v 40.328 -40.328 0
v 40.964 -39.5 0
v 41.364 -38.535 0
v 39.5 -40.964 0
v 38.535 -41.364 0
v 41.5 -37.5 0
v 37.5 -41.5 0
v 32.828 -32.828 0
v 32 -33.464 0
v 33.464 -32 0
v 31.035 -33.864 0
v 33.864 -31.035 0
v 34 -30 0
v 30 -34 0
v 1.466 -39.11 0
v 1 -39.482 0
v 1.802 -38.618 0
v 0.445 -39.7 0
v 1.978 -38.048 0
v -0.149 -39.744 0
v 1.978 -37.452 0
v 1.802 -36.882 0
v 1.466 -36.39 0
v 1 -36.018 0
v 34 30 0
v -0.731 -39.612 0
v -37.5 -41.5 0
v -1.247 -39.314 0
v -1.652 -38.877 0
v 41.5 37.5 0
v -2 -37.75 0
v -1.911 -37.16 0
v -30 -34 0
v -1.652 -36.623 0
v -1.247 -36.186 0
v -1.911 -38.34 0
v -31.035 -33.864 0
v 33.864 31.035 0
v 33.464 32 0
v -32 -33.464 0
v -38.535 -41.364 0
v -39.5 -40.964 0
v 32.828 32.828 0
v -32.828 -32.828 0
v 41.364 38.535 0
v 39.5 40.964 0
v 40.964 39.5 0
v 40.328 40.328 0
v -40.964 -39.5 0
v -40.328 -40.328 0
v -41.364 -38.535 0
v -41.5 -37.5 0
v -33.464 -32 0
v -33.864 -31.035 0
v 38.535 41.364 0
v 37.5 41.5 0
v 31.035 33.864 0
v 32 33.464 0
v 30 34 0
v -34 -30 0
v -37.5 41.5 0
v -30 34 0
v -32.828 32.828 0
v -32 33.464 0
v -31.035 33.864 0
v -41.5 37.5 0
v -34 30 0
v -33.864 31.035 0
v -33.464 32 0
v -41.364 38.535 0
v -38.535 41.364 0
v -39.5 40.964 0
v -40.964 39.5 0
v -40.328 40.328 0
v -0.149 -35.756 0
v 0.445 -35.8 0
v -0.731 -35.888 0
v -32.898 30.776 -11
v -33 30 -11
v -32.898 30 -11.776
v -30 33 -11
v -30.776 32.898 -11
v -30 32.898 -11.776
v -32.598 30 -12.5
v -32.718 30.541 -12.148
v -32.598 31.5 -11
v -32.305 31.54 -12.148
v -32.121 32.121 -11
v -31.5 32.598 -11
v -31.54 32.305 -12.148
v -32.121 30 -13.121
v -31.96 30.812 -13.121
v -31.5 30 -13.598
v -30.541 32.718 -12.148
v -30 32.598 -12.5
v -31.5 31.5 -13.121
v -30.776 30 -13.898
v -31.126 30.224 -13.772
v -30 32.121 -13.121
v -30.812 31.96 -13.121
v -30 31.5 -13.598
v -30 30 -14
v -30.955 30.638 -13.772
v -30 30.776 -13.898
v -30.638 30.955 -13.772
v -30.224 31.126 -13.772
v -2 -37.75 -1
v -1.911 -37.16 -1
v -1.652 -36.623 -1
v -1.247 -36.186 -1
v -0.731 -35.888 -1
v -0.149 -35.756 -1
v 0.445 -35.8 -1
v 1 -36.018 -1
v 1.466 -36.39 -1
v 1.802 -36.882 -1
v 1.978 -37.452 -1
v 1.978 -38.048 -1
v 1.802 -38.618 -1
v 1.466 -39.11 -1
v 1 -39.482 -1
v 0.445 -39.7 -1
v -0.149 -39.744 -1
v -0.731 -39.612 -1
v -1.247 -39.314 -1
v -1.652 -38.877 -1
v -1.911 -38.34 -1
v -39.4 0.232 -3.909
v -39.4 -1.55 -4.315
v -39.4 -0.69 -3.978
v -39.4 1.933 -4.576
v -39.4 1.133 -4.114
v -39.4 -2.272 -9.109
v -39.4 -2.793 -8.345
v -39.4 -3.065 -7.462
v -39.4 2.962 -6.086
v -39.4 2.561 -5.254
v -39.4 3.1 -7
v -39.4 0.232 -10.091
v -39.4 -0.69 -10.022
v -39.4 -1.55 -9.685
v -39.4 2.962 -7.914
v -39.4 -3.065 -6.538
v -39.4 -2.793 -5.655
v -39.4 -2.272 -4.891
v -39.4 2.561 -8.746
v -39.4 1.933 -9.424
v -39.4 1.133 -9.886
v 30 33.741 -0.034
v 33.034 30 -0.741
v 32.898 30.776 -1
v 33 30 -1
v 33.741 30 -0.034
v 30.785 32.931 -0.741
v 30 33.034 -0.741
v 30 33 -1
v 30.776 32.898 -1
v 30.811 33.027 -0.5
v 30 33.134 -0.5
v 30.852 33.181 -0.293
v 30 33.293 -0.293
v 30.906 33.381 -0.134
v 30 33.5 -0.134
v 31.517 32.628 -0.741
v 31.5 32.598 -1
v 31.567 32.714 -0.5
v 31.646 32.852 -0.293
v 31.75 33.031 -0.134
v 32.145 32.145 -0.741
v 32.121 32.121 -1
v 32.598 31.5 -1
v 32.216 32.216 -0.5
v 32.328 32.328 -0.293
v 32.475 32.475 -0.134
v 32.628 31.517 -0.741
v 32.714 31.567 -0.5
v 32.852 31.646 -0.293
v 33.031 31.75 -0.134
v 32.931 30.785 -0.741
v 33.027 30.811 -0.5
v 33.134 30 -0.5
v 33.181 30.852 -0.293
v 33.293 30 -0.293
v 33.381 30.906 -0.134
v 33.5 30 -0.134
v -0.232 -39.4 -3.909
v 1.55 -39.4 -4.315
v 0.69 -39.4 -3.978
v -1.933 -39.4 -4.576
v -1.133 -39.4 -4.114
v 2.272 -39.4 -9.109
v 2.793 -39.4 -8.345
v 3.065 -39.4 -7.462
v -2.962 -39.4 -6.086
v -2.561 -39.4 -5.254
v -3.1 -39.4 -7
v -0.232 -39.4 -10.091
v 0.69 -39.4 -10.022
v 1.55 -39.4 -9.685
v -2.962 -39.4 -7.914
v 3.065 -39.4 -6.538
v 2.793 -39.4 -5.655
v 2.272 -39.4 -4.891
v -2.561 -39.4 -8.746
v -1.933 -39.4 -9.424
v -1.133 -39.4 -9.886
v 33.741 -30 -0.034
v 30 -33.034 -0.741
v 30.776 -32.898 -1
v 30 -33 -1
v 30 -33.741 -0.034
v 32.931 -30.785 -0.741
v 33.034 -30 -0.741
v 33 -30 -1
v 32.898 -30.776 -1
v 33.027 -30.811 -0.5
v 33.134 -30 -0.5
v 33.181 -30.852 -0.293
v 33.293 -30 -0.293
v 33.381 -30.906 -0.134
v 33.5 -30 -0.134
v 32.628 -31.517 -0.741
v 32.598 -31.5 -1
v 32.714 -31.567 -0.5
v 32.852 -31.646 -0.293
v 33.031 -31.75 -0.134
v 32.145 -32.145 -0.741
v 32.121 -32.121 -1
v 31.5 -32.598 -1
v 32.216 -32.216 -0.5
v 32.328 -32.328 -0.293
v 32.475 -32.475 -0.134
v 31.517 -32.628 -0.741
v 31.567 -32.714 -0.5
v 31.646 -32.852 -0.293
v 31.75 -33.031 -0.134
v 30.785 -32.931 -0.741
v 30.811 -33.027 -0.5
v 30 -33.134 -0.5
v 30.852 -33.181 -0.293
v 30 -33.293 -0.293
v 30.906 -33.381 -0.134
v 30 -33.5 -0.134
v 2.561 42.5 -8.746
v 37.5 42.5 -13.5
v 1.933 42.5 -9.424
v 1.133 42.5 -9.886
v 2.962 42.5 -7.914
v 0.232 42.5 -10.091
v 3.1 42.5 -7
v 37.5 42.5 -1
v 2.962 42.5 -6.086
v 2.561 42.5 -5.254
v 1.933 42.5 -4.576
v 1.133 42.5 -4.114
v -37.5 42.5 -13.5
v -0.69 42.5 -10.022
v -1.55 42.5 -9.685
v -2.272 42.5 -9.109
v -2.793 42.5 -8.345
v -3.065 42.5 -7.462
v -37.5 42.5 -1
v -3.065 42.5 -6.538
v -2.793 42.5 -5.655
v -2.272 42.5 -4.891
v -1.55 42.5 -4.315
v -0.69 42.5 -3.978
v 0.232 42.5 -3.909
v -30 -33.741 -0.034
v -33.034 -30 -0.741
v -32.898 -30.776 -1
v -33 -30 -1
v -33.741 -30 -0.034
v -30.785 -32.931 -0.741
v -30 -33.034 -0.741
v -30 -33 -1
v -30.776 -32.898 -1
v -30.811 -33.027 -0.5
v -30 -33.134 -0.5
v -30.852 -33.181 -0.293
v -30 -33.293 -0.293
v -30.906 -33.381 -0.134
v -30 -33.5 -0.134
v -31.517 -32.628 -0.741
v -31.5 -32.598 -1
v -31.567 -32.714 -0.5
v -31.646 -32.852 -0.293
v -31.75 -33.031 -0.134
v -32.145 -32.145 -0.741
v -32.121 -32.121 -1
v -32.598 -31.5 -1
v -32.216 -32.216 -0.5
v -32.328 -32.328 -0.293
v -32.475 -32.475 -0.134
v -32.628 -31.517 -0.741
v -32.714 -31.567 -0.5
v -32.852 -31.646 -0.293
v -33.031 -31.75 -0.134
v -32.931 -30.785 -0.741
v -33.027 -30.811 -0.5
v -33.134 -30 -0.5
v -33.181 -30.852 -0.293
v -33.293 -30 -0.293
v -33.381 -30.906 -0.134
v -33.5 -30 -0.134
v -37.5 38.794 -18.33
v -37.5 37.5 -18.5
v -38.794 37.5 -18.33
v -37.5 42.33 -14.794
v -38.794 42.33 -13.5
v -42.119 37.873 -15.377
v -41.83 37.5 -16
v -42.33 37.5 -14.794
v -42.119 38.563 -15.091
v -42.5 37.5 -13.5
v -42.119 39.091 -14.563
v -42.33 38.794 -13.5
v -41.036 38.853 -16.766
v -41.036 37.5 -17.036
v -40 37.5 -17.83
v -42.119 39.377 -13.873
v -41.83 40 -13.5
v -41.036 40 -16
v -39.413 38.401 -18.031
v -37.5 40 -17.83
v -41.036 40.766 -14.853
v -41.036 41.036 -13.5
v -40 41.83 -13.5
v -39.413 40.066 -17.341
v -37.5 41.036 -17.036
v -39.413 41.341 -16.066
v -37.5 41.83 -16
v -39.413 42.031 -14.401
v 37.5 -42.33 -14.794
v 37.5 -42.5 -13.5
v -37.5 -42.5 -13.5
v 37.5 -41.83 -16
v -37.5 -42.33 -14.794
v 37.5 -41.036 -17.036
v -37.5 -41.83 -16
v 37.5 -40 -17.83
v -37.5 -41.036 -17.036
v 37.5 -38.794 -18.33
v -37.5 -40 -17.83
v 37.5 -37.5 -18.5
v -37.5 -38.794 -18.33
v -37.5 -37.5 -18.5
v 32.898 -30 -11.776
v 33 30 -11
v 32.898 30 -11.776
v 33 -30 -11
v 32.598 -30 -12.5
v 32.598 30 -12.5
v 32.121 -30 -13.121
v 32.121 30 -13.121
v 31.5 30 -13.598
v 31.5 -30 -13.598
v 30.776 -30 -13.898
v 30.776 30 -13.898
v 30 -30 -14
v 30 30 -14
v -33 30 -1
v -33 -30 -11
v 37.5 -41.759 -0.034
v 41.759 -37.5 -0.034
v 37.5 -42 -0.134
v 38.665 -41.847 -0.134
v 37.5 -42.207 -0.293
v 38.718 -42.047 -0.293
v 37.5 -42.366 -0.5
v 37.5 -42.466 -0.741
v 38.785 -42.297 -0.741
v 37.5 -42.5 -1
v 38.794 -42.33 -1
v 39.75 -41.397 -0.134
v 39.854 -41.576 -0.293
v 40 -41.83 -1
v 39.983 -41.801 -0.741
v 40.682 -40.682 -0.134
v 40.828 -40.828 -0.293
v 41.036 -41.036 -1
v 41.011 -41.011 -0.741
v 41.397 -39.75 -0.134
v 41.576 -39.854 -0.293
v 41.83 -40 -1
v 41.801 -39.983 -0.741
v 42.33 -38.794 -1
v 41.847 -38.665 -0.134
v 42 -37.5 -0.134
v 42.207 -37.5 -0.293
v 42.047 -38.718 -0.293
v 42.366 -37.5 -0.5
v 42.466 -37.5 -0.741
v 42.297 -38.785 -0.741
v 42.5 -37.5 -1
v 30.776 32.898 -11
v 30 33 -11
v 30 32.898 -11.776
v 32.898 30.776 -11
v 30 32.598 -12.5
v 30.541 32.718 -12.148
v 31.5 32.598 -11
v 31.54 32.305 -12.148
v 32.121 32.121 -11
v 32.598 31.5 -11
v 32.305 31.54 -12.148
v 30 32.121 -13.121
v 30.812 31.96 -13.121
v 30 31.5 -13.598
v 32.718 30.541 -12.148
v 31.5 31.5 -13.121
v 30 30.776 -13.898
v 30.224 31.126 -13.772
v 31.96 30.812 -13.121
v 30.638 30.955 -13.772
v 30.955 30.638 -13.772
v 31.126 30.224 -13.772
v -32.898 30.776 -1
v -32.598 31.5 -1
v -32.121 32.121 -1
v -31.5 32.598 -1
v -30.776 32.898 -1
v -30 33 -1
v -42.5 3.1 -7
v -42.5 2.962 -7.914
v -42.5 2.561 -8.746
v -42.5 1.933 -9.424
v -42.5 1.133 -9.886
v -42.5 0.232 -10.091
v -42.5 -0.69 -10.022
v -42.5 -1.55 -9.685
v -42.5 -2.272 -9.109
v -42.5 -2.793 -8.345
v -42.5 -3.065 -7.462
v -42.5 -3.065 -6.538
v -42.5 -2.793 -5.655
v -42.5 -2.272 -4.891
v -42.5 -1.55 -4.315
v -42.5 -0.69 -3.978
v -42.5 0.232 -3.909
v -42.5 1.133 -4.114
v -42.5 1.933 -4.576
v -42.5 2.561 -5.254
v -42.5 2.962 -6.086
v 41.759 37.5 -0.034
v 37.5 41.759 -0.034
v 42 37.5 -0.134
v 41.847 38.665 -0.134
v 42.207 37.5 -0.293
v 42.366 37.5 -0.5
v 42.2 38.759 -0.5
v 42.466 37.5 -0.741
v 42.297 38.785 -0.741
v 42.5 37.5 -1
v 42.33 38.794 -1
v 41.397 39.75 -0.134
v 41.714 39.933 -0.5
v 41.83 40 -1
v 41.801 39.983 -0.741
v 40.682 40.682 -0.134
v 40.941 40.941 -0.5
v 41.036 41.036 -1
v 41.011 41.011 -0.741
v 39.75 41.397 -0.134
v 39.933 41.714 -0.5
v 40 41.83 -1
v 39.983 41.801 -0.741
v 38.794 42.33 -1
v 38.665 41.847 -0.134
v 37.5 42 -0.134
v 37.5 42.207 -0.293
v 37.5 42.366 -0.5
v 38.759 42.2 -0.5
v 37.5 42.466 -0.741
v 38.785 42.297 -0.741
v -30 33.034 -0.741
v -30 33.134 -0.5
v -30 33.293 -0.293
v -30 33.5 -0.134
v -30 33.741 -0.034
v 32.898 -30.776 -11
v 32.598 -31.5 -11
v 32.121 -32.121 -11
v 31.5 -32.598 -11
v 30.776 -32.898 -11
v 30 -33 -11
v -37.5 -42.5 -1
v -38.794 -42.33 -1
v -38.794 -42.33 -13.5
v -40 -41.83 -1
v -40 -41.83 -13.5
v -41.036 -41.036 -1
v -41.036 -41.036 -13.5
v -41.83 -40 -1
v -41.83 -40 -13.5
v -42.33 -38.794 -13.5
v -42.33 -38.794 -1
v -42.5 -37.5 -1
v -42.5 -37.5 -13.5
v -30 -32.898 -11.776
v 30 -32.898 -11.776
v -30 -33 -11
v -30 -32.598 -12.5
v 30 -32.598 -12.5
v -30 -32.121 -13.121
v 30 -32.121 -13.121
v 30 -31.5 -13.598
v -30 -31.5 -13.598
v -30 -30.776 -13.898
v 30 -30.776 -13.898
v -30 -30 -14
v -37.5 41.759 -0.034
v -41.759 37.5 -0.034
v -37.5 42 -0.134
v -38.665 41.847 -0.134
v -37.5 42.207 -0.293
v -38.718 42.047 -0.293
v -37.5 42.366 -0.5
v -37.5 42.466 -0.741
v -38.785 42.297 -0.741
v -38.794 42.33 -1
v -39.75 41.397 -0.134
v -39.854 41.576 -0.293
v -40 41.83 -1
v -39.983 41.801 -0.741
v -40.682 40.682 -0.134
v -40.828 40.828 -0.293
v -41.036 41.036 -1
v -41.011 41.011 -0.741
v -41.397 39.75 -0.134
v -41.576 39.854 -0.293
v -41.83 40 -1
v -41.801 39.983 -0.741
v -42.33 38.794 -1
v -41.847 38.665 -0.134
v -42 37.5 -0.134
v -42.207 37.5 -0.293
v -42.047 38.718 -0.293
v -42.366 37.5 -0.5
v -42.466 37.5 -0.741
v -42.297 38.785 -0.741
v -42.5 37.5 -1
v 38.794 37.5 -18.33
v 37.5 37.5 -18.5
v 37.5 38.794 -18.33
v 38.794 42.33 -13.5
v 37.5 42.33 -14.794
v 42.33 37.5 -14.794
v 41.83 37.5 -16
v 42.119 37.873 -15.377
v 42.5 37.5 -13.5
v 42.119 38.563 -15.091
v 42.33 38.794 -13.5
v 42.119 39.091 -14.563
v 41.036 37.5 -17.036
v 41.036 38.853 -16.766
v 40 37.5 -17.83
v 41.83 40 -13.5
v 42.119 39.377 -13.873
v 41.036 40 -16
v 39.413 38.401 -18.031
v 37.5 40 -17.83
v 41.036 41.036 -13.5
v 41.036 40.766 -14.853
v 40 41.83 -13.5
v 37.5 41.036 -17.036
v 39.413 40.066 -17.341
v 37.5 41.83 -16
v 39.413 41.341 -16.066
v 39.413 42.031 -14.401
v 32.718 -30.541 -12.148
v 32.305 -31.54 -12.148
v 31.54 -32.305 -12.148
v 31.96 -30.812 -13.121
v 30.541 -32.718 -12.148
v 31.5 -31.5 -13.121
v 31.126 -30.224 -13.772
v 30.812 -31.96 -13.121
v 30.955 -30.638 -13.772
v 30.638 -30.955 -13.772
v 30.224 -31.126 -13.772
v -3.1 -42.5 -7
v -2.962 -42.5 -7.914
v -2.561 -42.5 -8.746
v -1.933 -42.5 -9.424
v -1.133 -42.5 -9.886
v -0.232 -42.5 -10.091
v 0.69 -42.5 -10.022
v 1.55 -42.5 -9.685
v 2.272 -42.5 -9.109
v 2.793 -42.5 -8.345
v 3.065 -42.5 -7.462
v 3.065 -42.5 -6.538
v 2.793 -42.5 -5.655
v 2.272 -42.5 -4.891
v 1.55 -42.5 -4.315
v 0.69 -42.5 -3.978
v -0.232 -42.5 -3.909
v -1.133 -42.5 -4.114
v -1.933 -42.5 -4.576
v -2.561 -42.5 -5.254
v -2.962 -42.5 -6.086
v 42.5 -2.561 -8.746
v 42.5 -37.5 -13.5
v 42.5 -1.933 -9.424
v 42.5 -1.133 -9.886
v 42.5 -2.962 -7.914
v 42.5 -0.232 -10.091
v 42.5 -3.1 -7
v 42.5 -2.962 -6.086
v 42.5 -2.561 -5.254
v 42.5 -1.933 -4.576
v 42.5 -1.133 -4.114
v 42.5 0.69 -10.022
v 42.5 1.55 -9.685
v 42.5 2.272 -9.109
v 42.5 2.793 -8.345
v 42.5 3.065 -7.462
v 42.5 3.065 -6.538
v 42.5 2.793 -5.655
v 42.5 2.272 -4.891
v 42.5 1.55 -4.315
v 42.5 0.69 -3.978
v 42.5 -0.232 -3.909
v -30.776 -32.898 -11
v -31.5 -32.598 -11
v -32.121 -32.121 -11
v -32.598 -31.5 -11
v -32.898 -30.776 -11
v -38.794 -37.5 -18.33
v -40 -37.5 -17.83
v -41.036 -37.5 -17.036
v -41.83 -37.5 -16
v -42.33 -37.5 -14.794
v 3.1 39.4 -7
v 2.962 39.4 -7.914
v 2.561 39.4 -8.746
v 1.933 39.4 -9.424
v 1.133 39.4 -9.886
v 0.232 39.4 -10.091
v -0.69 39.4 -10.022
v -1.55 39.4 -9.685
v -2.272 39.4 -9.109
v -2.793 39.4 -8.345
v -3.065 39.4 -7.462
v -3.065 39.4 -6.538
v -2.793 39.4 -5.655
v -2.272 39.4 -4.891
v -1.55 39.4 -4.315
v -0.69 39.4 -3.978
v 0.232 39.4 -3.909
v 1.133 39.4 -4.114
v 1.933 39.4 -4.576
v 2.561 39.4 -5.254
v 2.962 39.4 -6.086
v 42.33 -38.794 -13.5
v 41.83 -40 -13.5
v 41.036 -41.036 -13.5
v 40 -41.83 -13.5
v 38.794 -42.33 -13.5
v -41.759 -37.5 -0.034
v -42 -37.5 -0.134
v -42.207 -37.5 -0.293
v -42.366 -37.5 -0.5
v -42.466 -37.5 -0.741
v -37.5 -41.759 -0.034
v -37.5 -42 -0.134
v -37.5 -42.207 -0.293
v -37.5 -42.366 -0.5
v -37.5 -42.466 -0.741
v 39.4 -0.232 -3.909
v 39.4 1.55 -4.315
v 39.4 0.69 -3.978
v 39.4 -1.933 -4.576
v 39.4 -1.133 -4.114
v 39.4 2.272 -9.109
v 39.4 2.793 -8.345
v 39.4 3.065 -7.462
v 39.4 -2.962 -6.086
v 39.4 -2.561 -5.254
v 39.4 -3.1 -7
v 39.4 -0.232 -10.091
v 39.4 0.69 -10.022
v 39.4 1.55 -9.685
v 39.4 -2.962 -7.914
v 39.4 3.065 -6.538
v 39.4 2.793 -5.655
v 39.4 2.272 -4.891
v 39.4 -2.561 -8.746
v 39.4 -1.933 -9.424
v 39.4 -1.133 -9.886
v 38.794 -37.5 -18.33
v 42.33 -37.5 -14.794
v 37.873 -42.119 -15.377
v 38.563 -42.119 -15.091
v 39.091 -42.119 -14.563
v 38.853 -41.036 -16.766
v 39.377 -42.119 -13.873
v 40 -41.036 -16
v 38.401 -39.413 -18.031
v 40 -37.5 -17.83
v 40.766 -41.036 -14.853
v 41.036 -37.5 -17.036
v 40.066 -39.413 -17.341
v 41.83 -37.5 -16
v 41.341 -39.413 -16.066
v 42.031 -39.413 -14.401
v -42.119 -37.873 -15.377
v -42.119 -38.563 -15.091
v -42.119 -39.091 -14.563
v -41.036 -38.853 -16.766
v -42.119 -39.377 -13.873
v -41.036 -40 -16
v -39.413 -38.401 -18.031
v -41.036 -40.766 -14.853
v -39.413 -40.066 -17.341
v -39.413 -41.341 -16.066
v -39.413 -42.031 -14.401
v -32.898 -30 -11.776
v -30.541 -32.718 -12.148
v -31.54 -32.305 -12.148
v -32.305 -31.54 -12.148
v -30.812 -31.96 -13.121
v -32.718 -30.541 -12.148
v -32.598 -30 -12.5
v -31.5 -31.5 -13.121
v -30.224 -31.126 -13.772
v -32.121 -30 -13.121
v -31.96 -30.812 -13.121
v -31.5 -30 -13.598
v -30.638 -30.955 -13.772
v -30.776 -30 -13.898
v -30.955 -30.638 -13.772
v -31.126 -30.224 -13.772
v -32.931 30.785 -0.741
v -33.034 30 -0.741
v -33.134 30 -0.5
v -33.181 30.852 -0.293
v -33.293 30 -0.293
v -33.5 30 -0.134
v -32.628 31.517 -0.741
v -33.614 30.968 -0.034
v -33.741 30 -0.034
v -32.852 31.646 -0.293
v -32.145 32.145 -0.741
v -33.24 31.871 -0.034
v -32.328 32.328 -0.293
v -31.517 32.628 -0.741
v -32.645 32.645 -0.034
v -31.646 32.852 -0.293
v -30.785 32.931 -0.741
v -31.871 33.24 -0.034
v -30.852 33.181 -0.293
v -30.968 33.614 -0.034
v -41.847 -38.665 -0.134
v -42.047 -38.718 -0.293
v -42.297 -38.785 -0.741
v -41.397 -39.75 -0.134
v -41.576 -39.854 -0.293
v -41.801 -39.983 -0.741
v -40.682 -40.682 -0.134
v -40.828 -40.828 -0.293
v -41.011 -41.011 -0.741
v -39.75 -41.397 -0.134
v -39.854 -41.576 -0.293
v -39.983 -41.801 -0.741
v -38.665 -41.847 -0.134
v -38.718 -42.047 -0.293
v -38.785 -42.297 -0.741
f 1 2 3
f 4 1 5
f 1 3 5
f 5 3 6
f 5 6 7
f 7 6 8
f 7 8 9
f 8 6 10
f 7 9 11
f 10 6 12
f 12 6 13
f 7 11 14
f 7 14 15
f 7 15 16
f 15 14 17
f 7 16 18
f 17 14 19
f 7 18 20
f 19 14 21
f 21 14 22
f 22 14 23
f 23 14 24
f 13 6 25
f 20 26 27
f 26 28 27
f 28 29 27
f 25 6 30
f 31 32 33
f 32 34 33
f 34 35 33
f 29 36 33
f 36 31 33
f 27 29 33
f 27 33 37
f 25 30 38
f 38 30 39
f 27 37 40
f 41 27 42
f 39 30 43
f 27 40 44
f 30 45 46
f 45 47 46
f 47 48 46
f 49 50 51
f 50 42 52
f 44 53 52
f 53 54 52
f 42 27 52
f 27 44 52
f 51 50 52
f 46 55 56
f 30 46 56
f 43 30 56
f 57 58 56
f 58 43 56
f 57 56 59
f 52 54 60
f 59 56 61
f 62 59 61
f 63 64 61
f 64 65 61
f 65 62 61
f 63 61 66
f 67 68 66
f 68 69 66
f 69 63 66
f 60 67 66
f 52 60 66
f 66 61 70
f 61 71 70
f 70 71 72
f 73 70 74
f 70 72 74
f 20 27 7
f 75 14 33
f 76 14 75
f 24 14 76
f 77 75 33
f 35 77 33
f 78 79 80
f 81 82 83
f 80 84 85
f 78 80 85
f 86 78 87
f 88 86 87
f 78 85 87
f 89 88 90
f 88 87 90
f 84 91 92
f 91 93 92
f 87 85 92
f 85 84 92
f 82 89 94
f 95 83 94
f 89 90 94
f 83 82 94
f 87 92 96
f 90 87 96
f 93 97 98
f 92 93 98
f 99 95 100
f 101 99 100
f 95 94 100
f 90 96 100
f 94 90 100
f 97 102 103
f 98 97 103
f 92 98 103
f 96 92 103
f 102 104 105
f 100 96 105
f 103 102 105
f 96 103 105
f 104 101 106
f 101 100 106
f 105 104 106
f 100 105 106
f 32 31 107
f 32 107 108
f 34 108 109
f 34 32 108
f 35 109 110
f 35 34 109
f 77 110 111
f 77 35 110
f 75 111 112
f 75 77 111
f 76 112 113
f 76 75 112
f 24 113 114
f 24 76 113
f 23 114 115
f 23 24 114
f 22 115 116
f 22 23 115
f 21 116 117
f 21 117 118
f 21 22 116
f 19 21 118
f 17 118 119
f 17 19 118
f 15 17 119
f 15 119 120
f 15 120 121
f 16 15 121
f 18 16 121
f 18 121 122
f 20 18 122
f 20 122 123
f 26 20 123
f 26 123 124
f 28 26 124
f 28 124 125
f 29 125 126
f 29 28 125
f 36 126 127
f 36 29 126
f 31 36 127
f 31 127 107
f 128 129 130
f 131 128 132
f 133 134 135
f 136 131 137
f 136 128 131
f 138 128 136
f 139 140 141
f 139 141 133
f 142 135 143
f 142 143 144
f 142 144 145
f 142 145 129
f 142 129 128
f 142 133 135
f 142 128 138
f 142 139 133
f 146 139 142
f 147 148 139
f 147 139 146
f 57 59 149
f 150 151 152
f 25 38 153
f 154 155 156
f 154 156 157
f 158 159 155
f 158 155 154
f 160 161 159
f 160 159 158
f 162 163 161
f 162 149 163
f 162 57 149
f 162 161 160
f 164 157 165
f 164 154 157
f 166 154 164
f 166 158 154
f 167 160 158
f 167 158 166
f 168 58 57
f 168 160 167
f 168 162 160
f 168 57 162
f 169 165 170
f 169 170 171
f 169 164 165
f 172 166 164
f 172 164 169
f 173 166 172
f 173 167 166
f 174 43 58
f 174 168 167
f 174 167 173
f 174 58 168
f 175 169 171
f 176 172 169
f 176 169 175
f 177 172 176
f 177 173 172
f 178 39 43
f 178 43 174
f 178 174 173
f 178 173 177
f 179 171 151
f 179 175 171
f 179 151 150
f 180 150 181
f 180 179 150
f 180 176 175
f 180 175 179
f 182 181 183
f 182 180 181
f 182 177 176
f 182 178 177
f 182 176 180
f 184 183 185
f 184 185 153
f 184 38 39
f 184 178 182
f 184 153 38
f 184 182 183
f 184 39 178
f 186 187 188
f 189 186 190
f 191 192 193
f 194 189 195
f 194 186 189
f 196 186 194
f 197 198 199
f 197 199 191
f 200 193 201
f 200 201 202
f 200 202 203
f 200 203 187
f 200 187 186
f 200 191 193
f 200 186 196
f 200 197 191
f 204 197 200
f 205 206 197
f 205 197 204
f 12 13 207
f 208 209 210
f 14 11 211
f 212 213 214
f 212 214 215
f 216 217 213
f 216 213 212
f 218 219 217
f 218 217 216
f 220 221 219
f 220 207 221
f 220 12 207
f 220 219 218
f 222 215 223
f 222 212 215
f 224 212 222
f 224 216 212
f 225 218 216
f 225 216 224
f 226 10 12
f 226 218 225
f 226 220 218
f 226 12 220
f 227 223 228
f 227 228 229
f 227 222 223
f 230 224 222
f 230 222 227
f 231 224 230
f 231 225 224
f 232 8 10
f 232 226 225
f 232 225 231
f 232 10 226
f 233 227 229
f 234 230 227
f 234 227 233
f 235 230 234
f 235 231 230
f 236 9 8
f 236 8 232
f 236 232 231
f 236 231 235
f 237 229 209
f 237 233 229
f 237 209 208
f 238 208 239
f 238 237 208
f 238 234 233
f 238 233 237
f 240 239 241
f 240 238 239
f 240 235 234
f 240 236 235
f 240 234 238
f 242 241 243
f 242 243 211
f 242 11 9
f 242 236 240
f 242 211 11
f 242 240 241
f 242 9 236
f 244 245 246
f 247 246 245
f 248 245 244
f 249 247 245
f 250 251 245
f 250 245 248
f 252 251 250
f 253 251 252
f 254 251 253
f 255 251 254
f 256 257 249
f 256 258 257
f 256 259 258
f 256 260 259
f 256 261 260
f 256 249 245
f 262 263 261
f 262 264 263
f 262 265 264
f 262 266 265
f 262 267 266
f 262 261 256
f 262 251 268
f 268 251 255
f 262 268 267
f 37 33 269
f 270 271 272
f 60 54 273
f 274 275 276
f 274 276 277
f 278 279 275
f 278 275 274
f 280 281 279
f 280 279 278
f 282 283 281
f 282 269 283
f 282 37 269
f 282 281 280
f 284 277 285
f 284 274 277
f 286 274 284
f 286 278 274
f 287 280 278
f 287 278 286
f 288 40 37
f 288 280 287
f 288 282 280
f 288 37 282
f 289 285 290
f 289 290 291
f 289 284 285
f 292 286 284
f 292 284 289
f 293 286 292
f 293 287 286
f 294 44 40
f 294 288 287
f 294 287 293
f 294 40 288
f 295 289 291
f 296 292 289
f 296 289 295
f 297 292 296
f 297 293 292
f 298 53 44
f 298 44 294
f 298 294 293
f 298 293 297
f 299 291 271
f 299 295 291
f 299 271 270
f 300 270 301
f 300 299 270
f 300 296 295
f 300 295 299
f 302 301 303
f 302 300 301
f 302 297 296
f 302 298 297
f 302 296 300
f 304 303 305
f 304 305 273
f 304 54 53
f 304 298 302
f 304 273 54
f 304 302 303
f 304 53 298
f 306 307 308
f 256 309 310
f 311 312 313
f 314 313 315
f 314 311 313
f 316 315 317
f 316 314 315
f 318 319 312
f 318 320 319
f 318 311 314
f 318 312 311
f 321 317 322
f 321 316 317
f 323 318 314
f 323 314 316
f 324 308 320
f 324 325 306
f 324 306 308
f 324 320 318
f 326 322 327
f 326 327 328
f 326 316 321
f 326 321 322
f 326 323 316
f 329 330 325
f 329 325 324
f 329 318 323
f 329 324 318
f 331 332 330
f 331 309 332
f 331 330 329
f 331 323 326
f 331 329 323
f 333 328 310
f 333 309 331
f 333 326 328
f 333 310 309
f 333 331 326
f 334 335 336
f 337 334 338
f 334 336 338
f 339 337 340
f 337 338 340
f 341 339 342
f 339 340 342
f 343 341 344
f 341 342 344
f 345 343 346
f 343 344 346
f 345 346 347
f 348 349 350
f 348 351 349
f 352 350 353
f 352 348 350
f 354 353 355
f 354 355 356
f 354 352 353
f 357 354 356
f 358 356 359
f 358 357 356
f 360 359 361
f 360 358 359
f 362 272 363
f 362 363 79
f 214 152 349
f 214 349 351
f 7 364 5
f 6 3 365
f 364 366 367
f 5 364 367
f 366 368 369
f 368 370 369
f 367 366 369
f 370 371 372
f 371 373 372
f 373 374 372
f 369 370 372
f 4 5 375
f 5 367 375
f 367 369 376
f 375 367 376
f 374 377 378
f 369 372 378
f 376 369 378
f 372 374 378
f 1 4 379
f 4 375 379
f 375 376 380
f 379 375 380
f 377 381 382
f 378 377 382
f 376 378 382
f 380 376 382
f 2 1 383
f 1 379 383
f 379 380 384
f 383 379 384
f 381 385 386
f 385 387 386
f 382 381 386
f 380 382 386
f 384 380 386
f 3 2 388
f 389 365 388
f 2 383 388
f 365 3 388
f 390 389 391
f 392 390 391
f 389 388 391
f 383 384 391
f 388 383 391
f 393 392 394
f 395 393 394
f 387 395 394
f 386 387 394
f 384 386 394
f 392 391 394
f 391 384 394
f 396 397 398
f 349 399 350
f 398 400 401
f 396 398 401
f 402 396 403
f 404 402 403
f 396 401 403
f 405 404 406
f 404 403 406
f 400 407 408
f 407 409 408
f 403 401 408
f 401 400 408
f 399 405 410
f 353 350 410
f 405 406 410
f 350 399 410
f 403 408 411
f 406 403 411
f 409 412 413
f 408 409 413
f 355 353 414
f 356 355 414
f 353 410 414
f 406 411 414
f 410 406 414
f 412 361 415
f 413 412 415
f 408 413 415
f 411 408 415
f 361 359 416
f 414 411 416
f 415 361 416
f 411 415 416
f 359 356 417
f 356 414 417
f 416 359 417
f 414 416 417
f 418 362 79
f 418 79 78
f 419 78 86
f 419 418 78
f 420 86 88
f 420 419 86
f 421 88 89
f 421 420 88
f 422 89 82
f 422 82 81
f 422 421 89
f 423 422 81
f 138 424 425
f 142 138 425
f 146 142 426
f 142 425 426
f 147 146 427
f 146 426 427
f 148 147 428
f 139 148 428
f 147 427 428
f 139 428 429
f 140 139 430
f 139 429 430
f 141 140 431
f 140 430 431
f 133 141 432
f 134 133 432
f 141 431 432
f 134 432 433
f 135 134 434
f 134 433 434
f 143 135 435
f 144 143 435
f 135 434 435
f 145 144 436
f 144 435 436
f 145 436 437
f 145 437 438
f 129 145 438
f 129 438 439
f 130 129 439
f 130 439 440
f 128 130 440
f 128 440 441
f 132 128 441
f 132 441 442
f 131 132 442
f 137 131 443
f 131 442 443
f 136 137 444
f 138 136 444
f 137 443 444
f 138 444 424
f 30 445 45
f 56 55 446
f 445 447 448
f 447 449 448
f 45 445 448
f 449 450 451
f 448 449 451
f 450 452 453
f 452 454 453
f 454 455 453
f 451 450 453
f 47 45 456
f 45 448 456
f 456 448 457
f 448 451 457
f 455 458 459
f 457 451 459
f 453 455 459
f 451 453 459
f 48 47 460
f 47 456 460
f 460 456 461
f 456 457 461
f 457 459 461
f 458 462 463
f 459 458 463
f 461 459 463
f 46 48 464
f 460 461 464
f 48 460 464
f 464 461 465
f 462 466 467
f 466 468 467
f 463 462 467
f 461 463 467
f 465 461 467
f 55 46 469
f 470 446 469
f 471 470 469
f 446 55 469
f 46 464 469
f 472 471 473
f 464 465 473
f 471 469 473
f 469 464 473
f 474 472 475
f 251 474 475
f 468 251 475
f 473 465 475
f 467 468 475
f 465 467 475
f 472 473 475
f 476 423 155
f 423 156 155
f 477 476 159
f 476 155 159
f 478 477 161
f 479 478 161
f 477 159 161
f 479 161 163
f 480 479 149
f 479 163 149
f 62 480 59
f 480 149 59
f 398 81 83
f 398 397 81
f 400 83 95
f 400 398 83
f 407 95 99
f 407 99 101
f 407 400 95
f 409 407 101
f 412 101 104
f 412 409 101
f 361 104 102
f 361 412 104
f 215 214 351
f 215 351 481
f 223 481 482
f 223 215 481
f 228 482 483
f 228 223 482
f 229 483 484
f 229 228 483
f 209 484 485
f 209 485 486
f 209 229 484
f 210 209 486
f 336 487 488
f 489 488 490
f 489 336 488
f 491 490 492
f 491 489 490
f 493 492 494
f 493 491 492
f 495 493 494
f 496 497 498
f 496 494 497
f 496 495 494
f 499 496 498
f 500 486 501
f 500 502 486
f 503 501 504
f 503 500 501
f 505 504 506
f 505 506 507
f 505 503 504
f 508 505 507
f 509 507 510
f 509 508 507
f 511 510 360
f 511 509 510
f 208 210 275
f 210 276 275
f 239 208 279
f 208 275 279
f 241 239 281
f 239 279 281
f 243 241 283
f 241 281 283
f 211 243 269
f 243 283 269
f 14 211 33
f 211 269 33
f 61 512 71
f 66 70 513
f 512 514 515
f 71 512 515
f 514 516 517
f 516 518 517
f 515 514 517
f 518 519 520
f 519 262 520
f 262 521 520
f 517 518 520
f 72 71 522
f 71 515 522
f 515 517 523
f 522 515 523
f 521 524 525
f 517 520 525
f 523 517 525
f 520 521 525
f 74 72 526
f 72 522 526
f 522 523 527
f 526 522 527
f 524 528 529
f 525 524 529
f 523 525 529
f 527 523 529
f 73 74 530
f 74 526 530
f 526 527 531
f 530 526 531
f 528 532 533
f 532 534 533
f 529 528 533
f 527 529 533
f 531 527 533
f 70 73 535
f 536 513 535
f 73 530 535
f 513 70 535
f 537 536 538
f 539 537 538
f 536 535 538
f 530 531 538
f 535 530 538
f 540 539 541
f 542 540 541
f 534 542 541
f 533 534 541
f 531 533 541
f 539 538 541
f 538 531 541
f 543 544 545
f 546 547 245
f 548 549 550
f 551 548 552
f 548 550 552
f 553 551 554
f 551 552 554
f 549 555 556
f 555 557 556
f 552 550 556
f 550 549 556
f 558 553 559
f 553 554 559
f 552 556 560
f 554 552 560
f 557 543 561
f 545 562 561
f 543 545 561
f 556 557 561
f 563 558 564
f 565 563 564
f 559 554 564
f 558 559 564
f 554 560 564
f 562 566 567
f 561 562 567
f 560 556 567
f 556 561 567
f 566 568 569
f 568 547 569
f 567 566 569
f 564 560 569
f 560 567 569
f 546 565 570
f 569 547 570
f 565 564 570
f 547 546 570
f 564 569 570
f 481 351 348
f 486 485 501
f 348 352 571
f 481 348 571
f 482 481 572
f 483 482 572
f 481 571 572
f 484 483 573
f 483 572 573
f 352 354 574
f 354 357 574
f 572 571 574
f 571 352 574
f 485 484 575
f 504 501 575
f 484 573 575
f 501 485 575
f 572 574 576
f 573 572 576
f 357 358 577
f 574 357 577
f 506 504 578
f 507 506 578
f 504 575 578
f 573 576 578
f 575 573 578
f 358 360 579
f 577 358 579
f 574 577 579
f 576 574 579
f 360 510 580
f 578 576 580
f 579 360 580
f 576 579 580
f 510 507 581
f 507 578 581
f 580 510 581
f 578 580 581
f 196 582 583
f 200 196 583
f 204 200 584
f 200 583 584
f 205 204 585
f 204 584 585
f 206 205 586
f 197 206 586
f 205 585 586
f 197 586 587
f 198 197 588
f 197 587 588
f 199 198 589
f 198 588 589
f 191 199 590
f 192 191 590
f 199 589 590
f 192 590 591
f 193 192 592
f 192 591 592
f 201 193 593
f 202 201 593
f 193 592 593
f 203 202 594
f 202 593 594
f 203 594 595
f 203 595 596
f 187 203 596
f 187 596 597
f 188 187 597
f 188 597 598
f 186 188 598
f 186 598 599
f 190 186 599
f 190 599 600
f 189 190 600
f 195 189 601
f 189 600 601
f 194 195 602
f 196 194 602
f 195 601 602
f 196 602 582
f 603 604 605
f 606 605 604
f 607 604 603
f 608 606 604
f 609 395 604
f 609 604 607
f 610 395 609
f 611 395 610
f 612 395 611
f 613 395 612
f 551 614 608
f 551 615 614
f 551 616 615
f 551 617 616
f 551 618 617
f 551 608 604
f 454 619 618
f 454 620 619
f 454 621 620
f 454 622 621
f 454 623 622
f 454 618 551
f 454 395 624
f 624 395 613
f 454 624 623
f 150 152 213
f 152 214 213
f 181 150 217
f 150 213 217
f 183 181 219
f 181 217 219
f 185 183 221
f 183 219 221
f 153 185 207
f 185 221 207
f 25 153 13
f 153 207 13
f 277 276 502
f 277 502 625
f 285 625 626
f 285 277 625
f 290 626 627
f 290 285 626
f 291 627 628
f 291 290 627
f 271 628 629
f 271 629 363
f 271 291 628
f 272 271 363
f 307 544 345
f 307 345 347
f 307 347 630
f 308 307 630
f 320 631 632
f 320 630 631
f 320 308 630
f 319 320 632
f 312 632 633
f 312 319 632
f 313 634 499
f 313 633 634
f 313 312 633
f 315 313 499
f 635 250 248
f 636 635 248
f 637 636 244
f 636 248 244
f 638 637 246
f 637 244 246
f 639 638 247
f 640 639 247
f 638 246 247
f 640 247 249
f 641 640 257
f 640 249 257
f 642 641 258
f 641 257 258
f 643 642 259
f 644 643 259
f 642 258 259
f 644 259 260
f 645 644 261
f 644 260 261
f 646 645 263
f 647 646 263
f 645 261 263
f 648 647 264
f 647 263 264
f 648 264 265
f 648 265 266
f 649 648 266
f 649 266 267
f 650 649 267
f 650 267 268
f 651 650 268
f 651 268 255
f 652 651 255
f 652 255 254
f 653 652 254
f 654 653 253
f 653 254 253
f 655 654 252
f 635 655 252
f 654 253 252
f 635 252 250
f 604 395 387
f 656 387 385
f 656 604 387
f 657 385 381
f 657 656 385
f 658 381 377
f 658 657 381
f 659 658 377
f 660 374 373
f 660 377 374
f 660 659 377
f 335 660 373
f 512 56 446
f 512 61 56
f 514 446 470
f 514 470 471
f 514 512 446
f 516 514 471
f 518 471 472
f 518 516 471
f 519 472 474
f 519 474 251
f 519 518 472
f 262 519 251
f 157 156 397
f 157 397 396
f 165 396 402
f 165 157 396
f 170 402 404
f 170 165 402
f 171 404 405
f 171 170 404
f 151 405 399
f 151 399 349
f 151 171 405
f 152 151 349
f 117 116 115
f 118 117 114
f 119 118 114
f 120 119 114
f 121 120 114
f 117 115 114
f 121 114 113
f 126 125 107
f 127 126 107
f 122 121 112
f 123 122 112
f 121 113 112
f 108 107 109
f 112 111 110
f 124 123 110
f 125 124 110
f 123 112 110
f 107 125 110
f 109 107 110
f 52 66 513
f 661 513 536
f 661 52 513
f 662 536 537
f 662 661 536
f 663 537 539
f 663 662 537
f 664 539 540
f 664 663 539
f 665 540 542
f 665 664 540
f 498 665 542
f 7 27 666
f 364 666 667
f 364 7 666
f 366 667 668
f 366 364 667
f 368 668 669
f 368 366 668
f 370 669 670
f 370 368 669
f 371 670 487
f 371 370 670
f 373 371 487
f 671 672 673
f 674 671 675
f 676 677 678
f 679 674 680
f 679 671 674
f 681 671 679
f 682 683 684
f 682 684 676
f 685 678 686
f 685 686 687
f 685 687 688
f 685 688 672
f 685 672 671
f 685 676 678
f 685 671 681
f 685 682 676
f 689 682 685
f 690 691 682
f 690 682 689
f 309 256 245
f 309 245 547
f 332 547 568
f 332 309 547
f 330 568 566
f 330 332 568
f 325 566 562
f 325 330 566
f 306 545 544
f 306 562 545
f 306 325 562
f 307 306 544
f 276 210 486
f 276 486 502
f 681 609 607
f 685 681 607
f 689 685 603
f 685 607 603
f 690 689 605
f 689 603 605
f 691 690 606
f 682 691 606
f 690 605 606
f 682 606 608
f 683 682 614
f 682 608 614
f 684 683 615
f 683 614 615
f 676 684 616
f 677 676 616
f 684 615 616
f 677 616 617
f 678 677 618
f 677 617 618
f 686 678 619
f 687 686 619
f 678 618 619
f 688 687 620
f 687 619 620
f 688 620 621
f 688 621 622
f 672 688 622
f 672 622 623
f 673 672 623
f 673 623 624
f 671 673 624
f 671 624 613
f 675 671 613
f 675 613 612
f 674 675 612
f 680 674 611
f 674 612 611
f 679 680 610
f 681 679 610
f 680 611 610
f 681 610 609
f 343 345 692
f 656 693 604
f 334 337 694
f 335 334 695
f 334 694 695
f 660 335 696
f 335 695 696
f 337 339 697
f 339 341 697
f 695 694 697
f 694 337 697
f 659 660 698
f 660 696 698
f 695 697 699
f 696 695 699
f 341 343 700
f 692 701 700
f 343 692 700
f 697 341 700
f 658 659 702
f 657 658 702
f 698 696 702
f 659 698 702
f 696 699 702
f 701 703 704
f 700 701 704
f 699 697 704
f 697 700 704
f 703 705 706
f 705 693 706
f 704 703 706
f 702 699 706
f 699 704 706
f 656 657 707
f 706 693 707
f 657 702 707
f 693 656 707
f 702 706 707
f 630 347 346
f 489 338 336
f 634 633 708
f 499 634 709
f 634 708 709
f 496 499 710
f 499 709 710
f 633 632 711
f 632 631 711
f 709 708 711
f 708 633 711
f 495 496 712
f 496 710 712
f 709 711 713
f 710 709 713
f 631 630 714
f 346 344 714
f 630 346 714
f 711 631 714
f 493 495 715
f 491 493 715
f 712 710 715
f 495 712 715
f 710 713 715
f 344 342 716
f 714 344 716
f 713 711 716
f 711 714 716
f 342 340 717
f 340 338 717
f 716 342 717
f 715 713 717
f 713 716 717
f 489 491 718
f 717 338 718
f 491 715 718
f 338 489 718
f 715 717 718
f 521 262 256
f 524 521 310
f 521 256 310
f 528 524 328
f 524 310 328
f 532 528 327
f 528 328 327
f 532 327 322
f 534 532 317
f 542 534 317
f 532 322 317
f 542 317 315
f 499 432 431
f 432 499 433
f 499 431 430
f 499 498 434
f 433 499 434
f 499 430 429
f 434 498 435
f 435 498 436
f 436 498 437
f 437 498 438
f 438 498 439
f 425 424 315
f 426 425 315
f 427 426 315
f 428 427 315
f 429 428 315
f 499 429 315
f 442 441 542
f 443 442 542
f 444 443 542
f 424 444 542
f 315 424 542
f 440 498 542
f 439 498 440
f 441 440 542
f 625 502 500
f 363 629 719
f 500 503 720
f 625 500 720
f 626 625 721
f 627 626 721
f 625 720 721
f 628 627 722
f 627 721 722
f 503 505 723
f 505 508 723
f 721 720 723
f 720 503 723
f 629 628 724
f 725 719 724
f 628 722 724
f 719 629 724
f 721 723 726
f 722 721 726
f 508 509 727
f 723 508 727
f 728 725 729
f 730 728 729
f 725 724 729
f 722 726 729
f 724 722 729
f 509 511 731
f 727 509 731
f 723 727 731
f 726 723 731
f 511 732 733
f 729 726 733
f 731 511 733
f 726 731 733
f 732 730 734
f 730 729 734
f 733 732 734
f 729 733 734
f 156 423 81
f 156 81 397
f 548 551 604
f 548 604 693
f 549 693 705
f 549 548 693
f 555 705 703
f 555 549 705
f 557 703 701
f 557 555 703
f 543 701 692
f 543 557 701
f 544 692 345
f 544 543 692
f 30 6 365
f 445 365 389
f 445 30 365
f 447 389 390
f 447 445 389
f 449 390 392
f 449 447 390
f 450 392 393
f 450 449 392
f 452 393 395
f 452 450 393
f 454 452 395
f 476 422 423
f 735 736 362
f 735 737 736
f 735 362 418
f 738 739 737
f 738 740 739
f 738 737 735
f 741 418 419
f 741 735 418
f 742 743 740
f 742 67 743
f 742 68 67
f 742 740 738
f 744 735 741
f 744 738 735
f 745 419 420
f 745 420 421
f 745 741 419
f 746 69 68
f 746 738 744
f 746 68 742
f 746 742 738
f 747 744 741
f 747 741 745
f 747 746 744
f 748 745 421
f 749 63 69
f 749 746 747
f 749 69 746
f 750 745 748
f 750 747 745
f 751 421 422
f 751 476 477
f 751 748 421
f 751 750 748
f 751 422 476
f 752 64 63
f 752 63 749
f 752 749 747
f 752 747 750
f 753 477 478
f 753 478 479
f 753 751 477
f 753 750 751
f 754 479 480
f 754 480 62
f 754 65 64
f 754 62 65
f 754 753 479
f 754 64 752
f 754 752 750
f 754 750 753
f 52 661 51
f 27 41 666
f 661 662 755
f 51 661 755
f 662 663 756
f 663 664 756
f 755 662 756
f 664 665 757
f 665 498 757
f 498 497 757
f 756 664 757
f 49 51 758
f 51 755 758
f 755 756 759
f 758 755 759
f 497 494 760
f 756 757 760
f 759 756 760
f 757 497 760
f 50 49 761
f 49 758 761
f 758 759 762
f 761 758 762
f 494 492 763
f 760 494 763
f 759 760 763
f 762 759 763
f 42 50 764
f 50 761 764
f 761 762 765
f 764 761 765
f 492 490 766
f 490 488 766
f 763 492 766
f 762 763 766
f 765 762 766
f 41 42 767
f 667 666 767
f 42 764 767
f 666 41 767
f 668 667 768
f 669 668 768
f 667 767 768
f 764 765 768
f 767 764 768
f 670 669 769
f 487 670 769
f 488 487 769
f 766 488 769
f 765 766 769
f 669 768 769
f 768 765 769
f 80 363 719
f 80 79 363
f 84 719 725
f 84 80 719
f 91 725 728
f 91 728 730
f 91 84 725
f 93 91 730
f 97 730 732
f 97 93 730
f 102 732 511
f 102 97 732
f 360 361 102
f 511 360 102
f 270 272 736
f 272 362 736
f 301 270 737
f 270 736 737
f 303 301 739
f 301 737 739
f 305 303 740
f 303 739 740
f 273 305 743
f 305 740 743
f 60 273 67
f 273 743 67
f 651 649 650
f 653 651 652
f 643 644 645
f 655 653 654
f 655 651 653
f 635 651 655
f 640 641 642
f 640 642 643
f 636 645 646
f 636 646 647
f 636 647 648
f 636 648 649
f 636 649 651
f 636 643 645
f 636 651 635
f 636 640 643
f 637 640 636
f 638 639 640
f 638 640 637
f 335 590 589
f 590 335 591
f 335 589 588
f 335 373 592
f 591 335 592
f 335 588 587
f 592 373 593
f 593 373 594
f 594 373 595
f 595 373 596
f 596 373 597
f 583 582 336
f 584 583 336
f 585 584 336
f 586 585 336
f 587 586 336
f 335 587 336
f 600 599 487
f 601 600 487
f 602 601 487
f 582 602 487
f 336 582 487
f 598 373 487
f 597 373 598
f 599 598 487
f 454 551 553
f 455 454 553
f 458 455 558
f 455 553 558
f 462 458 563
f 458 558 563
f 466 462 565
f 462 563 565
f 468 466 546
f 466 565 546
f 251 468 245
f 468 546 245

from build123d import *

# Parameters (mm, degrees)
F0_W      = 85
F0_H      = 85
F0_R      = 2
F3_DEPTH  = 18.5
F4_DEPTH  = 14
F5_R      = 5
F6_R      = 3
F7_R      = 1
F8_R      = 3.1
F9_DEPTH  = 3.1
F10_R     = 3.1
F11_DEPTH = 3.1
F12_R     = 3.1
F13_DEPTH = 3.1
F14_R     = 3.1
F15_DEPTH = 3.1
F16_DEPTH = 1
F17_ANGLE = 180


# Not quite as in the source:
# - a feature names something its author has since deleted; it is built from what else it names


with BuildPart() as f3:
    # F0 (on Top) → F3 (new body)
    with BuildSketch(Plane.XY):
        Rectangle(F0_W, F0_H)
        with Locations((0, -37.75)):
            Circle(F0_R, mode=Mode.SUBTRACT)
        with BuildLine():
            ThreePointArc((-33, 30), (-32.1213203436, 32.1213203436), (-30, 33))
            Line((-30, 33), (30, 33))
            ThreePointArc((30, 33), (32.1213203436, 32.1213203436), (33, 30))
            Line((33, 30), (33, -30))
            ThreePointArc((33, -30), (32.1213203436, -32.1213203436), (30, -33))
            Line((30, -33), (-30, -33))
            ThreePointArc((-30, -33), (-32.1213203436, -32.1213203436), (-33, -30))
            Line((-33, -30), (-33, 30))
        make_face(mode=Mode.SUBTRACT)
        with BuildLine():
            Line((30, 33), (-30, 33))
            ThreePointArc((-30, 33), (-32.1213203436, 32.1213203436), (-33, 30))
            Line((-33, 30), (-33, -30))
            ThreePointArc((-33, -30), (-32.1213203436, -32.1213203436), (-30, -33))
            Line((-30, -33), (30, -33))
            ThreePointArc((30, -33), (32.1213203436, -32.1213203436), (33, -30))
            Line((33, -30), (33, 30))
            ThreePointArc((33, 30), (32.1213203436, 32.1213203436), (30, 33))
        make_face()
        with Locations((0, -37.75)):
            Circle(F0_R)
    extrude(amount=F3_DEPTH)

    # F0 (on Top) → F4 (cut)
    with BuildSketch(Plane.XY):
        with BuildLine():
            Line((30, 33), (-30, 33))
            ThreePointArc((-30, 33), (-32.1213203436, 32.1213203436), (-33, 30))
            Line((-33, 30), (-33, -30))
            ThreePointArc((-33, -30), (-32.1213203436, -32.1213203436), (-30, -33))
            Line((-30, -33), (30, -33))
            ThreePointArc((30, -33), (32.1213203436, -32.1213203436), (33, -30))
            Line((33, -30), (33, 30))
            ThreePointArc((33, 30), (32.1213203436, 32.1213203436), (30, 33))
        make_face()
    extrude(amount=F4_DEPTH, mode=Mode.SUBTRACT)

    # F5
    f5_edges = [f3.edges().sort_by_distance(p)[0] for p in [
        (0, 42.5, 18.5),
        (-42.5, 0, 18.5),
        (0, -42.5, 18.5),
        (42.5, 0, 18.5),
        (42.5, 42.5, 9.25),
        (-42.5, 42.5, 9.25),
        (-42.5, -42.5, 9.25),
        (42.5, -42.5, 9.25),
    ]]
    fillet(f5_edges, radius=F5_R)

    # F6
    f6_edges = [f3.edges().sort_by_distance(p)[0] for p in [
        (0, 33, 14),
        (-32.12132, 32.12132, 14),
        (-33, 0, 14),
        (-32.12132, -32.12132, 14),
        (0, -33, 14),
        (32.12132, -32.12132, 14),
        (33, 0, 14),
        (32.12132, 32.12132, 14),
    ]]
    fillet(f6_edges, radius=F6_R)

    # F7
    f7_edges = [f3.edges().sort_by_distance(p)[0] for p in [
        (0, 42.5, 0),
        (41.035534, 41.035534, 0),
        (-41.035534, 41.035534, 0),
        (42.5, 0, 0),
        (-42.5, 0, 0),
        (41.035534, -41.035534, 0),
        (-41.035534, -41.035534, 0),
        (0, -42.5, 0),
        (0, 33, 0),
        (-32.12132, 32.12132, 0),
        (-33, 0, 0),
        (-32.12132, -32.12132, 0),
        (0, -33, 0),
        (32.12132, -32.12132, 0),
        (33, 0, 0),
        (32.12132, 32.12132, 0),
    ]]
    fillet(f7_edges, radius=F7_R)

    # F8 (on face) → F9 (cut)
    with BuildSketch(Plane.XZ.offset(42.5)):
        with Locations((0, 7)):
            Circle(F8_R)
    extrude(amount=-F9_DEPTH, mode=Mode.SUBTRACT)

    # F10 (on face) → F11 (cut)
    with BuildSketch(Plane(origin=(0, 42.5, 0), x_dir=(-1, 0, 0), z_dir=(0, 1, 0))):
        with Locations((0, 7)):
            Circle(F10_R)
    extrude(amount=-F11_DEPTH, mode=Mode.SUBTRACT)

    # F12 (on face) → F13 (cut)
    with BuildSketch(Plane(origin=(-42.5, 0, 0), x_dir=(0, -1, 0), z_dir=(-1, 0, 0))):
        with Locations((0, 7)):
            Circle(F12_R)
    extrude(amount=-F13_DEPTH, mode=Mode.SUBTRACT)

    # F14 (on face) → F15 (cut)
    with BuildSketch(Plane.YZ.offset(42.5)):
        with Locations((0, 7)):
            Circle(F14_R)
    extrude(amount=-F15_DEPTH, mode=Mode.SUBTRACT)

    # F0 (on Top) → F16 (cut)
    with BuildSketch(Plane.XY):
        with Locations((0, -37.75)):
            Circle(F0_R)
    extrude(amount=F16_DEPTH, mode=Mode.SUBTRACT)


with BuildPart() as f3_1:
    # F17: moved
    add(f3.part.rotate(Axis((0, 0, 0), (0, 1, 0)), F17_ANGLE))


solid = f3_1.part
